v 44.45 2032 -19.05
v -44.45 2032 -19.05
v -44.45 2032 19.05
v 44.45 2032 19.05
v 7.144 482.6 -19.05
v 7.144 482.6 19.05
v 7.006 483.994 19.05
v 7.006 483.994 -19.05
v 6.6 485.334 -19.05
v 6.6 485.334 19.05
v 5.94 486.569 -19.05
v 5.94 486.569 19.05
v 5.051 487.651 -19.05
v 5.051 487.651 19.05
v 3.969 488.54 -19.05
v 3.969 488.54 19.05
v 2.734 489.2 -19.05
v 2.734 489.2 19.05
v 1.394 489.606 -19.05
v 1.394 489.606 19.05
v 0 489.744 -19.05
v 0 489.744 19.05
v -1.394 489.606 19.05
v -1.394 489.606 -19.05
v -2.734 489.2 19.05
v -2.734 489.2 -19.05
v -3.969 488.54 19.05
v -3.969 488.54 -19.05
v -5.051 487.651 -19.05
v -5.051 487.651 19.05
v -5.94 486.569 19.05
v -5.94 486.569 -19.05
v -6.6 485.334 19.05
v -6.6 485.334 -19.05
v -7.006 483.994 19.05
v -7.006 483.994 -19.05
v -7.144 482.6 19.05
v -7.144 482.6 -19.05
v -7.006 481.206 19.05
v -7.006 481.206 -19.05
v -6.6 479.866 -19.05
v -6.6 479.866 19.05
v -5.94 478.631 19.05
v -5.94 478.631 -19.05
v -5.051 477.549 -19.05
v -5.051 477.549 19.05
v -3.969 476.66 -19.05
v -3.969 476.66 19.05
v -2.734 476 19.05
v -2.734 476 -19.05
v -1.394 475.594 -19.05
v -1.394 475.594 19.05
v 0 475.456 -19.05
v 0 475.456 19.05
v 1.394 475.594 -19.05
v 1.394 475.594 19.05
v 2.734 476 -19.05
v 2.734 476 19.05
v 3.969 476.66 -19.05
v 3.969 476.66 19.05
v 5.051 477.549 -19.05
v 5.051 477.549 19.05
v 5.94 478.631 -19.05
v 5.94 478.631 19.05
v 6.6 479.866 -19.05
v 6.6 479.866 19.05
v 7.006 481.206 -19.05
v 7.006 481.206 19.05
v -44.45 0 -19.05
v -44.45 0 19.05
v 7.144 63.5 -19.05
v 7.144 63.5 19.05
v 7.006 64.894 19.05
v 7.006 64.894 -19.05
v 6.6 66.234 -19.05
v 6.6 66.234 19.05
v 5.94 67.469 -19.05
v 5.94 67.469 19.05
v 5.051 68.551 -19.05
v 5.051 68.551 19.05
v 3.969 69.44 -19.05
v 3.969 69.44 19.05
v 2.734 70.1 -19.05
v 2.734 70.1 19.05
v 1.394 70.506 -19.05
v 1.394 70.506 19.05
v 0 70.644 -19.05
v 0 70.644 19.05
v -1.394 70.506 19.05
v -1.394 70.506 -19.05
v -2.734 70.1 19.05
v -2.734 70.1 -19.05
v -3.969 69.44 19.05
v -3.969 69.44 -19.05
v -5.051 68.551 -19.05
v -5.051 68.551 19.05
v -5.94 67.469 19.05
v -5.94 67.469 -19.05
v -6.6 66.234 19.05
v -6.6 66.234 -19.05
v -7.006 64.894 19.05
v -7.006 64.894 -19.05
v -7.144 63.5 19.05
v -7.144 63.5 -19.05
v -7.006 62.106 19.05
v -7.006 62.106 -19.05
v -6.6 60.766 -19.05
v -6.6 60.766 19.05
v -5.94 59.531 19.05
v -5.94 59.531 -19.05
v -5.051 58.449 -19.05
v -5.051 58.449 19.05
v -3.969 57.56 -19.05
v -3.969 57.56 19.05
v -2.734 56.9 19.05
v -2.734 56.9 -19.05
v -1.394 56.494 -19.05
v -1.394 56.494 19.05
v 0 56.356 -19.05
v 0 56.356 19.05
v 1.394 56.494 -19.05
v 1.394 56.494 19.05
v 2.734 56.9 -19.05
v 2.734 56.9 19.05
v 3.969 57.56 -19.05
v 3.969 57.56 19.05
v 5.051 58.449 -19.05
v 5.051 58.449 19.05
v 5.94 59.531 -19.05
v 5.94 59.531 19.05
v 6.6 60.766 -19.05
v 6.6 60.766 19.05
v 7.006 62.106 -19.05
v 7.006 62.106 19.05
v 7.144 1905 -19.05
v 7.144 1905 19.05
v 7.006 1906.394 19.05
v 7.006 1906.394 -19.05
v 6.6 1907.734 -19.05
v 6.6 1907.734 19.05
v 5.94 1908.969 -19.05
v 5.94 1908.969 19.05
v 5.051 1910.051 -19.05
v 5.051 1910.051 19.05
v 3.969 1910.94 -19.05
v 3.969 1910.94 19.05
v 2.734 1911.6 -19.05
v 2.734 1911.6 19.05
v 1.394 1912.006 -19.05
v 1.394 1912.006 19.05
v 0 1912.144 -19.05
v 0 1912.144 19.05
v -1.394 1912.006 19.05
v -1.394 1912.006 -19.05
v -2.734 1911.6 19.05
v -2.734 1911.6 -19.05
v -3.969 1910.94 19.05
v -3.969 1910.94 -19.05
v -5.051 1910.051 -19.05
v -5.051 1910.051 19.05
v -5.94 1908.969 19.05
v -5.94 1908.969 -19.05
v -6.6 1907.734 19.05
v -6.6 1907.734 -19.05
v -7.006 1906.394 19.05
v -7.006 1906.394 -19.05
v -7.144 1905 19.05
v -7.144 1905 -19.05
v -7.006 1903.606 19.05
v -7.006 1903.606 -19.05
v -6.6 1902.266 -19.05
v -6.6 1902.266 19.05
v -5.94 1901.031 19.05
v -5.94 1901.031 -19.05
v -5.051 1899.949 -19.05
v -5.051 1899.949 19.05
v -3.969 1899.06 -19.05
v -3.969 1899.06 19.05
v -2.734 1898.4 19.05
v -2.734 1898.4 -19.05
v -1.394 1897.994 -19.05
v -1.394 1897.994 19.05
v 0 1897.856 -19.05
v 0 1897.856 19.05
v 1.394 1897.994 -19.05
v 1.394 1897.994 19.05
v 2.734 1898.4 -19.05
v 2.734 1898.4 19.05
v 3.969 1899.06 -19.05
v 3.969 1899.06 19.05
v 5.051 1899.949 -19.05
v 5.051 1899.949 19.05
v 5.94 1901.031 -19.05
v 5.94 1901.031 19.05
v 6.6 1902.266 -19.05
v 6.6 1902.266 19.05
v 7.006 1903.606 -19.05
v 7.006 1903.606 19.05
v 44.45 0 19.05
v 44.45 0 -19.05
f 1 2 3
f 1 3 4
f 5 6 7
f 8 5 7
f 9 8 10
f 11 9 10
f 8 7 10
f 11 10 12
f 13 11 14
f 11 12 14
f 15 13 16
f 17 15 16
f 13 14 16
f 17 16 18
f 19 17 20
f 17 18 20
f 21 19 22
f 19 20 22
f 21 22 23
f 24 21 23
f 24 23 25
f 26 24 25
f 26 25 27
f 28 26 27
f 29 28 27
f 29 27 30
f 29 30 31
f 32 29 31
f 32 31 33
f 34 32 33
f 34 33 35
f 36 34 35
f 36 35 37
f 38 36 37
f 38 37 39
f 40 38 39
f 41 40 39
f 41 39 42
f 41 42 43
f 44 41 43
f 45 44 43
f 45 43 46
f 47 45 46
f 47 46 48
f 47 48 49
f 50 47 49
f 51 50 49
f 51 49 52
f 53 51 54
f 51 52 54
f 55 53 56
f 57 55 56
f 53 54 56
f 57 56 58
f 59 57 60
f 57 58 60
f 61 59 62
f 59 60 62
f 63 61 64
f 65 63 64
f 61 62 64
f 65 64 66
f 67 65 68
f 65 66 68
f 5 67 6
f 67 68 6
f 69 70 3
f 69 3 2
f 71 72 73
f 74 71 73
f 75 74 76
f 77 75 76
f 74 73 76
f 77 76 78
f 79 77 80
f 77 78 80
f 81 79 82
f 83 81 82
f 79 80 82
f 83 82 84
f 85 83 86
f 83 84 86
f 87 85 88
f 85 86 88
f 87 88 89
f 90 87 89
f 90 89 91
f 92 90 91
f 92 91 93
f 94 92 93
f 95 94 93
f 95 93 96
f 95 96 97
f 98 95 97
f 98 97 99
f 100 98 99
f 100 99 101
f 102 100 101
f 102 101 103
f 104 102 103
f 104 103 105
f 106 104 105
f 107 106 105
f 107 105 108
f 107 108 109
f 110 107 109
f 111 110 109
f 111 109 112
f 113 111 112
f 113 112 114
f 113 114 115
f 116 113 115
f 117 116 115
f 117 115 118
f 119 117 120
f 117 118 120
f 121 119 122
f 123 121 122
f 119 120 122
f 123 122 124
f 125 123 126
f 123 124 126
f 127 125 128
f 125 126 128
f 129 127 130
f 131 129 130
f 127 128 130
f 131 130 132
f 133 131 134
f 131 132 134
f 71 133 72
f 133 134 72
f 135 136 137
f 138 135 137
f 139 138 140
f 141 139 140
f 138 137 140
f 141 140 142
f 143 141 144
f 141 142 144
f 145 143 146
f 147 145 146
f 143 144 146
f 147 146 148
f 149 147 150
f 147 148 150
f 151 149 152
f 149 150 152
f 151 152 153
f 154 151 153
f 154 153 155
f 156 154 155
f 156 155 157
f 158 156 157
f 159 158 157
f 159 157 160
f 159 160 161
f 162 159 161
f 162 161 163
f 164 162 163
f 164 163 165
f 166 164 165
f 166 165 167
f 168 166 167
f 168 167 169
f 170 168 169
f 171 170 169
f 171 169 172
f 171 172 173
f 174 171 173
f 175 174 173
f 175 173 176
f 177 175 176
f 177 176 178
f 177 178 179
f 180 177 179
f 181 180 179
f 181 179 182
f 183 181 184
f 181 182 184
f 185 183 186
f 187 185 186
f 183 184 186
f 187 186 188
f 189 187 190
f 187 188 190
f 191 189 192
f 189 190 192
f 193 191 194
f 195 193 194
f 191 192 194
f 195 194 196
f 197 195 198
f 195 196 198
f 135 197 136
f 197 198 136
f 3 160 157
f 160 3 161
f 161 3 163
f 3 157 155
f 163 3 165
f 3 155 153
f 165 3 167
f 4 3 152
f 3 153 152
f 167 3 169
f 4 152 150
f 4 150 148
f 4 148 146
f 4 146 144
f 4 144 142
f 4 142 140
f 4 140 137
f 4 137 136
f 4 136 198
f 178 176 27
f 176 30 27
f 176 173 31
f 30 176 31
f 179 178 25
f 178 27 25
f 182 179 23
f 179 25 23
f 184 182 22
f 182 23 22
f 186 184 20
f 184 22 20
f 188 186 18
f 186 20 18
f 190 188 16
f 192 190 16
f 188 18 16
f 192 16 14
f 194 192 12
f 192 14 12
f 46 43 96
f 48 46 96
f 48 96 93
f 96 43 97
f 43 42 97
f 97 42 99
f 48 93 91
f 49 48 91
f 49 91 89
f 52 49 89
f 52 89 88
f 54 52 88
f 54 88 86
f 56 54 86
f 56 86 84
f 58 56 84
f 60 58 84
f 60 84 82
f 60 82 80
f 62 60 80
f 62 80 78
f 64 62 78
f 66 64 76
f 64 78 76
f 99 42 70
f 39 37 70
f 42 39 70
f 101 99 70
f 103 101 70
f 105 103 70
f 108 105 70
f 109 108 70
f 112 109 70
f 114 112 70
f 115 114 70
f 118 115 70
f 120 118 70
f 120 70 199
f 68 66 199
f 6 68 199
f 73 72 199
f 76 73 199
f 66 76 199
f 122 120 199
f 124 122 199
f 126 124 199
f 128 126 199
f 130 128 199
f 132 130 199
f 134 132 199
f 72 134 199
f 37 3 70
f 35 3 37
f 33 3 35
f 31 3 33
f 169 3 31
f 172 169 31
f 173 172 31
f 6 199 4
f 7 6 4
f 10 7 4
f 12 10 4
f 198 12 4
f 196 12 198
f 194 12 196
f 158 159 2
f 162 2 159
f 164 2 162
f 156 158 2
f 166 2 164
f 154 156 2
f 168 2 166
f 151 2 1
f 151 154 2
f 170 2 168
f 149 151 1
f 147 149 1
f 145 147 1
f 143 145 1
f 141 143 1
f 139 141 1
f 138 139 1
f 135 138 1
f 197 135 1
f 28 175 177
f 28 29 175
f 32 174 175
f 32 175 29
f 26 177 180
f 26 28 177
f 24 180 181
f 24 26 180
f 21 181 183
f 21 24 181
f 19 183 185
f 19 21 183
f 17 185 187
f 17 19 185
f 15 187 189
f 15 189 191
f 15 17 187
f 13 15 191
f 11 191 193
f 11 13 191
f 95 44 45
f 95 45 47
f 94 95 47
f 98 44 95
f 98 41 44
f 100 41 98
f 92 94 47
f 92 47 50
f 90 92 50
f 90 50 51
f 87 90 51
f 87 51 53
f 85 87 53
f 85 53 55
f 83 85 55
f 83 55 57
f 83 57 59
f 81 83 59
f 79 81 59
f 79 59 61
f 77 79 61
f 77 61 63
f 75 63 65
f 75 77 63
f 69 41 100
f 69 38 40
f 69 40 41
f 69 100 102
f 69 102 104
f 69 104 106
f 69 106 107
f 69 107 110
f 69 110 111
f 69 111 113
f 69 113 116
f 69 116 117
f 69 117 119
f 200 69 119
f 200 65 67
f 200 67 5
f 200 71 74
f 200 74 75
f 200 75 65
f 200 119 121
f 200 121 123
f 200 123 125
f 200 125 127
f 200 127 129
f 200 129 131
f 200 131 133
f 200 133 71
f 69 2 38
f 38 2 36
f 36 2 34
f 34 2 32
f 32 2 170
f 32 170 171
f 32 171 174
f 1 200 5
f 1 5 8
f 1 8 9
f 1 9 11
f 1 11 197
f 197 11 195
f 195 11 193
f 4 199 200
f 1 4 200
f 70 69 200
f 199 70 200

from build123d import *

# Parameters (mm, degrees)
SKETCH1_W               = 88.9
SKETCH1_H               = 38.1
BOSS_EXTRUDE1_DEPTH     = 2032
SKETCH2_R               = 7.14375
CUT_EXTRUDE1_DEPTH      = 1
CUT_EXTRUDE1_DEPTH_BACK = 39.1


with BuildPart() as part:
    # Sketch1 → Boss-Extrude1 (new body)
    with BuildSketch(Plane(origin=(0, 0, 0), x_dir=(1, 0, 0), z_dir=(0, 1, 0))):
        Rectangle(SKETCH1_W, SKETCH1_H)
    extrude(amount=BOSS_EXTRUDE1_DEPTH)

    # Sketch2 → Cut-Extrude1 (cut, two sides)
    with BuildSketch(Plane.XY.offset(19.05)) as cut_extrude1_sk:
        with Locations((0, 63.5)):
            Circle(SKETCH2_R)
        with Locations((0, 482.6)):
            Circle(SKETCH2_R)
        with Locations((0, 1905)):
            Circle(SKETCH2_R)
    extrude(amount=CUT_EXTRUDE1_DEPTH, mode=Mode.SUBTRACT)
    extrude(cut_extrude1_sk.sketch, amount=-CUT_EXTRUDE1_DEPTH_BACK, mode=Mode.SUBTRACT)


solid = part.part
